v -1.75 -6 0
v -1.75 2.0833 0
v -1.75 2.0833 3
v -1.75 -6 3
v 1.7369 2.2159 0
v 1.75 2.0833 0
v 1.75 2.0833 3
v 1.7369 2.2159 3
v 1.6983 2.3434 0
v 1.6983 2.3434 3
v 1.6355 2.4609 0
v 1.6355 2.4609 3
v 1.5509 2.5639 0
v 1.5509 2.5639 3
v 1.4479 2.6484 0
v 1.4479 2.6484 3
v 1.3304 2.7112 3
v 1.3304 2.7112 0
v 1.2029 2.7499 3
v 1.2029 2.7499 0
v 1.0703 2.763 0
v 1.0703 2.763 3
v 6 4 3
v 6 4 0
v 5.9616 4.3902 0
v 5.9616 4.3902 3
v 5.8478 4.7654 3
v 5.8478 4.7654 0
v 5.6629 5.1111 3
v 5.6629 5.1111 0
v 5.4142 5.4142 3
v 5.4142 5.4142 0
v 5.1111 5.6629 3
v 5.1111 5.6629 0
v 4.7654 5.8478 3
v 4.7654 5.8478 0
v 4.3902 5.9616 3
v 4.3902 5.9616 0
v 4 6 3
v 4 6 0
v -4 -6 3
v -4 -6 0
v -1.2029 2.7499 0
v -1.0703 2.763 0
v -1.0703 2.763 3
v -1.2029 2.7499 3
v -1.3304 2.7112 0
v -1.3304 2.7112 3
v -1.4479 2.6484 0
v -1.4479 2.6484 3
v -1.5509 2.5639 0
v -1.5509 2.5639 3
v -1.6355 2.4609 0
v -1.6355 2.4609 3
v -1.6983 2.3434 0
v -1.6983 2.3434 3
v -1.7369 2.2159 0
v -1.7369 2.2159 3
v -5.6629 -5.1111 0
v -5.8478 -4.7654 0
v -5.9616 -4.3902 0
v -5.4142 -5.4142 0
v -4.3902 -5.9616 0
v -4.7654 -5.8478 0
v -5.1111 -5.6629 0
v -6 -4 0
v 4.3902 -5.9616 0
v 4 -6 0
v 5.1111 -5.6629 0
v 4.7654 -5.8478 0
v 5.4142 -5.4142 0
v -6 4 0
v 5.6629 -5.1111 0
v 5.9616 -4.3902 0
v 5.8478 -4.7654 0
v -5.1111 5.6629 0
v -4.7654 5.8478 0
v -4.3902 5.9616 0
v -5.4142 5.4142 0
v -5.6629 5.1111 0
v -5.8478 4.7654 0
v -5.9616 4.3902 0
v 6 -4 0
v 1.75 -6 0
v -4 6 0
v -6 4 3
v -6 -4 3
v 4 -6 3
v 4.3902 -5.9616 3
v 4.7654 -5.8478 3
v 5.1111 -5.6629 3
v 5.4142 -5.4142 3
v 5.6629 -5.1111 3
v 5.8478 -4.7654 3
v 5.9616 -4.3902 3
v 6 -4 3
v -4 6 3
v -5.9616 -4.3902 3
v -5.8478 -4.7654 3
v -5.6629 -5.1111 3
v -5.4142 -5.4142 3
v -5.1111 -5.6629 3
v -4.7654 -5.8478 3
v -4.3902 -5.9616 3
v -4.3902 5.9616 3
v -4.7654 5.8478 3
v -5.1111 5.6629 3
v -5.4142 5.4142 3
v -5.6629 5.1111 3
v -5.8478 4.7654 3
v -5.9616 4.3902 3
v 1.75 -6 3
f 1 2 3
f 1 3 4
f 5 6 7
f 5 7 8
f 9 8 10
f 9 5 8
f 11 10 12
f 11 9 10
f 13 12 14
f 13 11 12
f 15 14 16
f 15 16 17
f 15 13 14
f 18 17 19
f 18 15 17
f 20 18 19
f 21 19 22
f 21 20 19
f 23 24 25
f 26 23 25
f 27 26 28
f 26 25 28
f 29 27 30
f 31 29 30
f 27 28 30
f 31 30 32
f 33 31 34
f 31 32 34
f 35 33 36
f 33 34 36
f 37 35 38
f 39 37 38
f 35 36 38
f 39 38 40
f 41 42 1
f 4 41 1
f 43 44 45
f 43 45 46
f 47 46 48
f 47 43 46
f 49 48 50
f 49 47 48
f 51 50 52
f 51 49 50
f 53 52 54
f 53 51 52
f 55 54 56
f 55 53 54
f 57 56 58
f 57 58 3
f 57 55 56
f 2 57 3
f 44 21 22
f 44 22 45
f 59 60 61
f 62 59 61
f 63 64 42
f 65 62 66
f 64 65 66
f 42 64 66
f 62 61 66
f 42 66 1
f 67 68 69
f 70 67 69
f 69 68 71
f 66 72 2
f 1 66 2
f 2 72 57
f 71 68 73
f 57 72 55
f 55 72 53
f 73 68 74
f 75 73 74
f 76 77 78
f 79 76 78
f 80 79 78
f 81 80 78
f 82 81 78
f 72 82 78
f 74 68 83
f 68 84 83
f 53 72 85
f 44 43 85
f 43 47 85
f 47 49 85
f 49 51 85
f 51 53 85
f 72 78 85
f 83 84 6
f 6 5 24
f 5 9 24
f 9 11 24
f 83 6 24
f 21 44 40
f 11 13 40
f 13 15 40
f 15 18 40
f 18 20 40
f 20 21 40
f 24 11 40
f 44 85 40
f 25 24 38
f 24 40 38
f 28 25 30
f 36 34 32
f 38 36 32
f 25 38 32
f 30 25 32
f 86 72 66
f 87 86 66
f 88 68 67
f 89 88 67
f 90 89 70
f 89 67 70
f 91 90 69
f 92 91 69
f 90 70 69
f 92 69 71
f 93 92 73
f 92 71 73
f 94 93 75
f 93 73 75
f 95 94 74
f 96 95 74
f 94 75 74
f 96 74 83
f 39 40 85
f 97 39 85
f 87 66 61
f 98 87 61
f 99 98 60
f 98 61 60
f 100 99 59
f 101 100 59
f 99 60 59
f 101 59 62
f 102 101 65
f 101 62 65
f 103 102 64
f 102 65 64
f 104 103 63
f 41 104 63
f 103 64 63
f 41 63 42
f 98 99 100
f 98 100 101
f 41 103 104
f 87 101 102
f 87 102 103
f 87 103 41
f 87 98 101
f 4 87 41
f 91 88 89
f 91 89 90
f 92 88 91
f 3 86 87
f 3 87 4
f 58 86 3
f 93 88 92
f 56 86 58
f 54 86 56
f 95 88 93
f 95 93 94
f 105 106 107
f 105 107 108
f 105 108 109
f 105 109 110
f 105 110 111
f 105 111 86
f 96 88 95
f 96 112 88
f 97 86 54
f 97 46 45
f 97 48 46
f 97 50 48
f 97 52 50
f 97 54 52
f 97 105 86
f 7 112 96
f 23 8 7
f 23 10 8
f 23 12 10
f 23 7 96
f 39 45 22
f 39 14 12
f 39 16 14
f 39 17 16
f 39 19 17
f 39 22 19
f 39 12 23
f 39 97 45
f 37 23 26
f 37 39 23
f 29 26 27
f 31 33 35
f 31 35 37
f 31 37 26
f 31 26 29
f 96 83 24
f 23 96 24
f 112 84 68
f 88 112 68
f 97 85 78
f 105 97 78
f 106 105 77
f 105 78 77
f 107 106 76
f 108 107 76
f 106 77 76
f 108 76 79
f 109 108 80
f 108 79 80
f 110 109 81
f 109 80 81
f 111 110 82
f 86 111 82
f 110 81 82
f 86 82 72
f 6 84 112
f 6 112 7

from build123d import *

# Parameters (mm, degrees)
PAD_DEPTH = 3


with BuildPart() as part:
    # Sketch (on XY_Plane of Origin) → Pad (new body)
    with BuildSketch(Plane.XY):
        with BuildLine():
            Line((-6, 4), (-6, -4))
            ThreePointArc((-6, -4), (-5.414214, -5.414214), (-4, -6))
            Line((-4, -6), (-1.75, -6))
            Line((-1.75, 2.083269), (-1.75, -6))
            ThreePointArc((-1.070312, 2.762957), (-1.550924, 2.563881), (-1.75, 2.083269))
            Line((1.070312, 2.762957), (-1.070312, 2.762957))
            ThreePointArc((1.75, 2.083269), (1.550924, 2.563881), (1.070312, 2.762957))
            Line((1.75, -6), (1.75, 2.083269))
            Line((1.75, -6), (4, -6))
            ThreePointArc((4, -6), (5.414214, -5.414214), (6, -4))
            Line((6, -4), (6, 4))
            ThreePointArc((6, 4), (5.414214, 5.414214), (4, 6))
            Line((4, 6), (-4, 6))
            ThreePointArc((-4, 6), (-5.414214, 5.414214), (-6, 4))
        make_face()
    extrude(amount=PAD_DEPTH)


solid = part.part
